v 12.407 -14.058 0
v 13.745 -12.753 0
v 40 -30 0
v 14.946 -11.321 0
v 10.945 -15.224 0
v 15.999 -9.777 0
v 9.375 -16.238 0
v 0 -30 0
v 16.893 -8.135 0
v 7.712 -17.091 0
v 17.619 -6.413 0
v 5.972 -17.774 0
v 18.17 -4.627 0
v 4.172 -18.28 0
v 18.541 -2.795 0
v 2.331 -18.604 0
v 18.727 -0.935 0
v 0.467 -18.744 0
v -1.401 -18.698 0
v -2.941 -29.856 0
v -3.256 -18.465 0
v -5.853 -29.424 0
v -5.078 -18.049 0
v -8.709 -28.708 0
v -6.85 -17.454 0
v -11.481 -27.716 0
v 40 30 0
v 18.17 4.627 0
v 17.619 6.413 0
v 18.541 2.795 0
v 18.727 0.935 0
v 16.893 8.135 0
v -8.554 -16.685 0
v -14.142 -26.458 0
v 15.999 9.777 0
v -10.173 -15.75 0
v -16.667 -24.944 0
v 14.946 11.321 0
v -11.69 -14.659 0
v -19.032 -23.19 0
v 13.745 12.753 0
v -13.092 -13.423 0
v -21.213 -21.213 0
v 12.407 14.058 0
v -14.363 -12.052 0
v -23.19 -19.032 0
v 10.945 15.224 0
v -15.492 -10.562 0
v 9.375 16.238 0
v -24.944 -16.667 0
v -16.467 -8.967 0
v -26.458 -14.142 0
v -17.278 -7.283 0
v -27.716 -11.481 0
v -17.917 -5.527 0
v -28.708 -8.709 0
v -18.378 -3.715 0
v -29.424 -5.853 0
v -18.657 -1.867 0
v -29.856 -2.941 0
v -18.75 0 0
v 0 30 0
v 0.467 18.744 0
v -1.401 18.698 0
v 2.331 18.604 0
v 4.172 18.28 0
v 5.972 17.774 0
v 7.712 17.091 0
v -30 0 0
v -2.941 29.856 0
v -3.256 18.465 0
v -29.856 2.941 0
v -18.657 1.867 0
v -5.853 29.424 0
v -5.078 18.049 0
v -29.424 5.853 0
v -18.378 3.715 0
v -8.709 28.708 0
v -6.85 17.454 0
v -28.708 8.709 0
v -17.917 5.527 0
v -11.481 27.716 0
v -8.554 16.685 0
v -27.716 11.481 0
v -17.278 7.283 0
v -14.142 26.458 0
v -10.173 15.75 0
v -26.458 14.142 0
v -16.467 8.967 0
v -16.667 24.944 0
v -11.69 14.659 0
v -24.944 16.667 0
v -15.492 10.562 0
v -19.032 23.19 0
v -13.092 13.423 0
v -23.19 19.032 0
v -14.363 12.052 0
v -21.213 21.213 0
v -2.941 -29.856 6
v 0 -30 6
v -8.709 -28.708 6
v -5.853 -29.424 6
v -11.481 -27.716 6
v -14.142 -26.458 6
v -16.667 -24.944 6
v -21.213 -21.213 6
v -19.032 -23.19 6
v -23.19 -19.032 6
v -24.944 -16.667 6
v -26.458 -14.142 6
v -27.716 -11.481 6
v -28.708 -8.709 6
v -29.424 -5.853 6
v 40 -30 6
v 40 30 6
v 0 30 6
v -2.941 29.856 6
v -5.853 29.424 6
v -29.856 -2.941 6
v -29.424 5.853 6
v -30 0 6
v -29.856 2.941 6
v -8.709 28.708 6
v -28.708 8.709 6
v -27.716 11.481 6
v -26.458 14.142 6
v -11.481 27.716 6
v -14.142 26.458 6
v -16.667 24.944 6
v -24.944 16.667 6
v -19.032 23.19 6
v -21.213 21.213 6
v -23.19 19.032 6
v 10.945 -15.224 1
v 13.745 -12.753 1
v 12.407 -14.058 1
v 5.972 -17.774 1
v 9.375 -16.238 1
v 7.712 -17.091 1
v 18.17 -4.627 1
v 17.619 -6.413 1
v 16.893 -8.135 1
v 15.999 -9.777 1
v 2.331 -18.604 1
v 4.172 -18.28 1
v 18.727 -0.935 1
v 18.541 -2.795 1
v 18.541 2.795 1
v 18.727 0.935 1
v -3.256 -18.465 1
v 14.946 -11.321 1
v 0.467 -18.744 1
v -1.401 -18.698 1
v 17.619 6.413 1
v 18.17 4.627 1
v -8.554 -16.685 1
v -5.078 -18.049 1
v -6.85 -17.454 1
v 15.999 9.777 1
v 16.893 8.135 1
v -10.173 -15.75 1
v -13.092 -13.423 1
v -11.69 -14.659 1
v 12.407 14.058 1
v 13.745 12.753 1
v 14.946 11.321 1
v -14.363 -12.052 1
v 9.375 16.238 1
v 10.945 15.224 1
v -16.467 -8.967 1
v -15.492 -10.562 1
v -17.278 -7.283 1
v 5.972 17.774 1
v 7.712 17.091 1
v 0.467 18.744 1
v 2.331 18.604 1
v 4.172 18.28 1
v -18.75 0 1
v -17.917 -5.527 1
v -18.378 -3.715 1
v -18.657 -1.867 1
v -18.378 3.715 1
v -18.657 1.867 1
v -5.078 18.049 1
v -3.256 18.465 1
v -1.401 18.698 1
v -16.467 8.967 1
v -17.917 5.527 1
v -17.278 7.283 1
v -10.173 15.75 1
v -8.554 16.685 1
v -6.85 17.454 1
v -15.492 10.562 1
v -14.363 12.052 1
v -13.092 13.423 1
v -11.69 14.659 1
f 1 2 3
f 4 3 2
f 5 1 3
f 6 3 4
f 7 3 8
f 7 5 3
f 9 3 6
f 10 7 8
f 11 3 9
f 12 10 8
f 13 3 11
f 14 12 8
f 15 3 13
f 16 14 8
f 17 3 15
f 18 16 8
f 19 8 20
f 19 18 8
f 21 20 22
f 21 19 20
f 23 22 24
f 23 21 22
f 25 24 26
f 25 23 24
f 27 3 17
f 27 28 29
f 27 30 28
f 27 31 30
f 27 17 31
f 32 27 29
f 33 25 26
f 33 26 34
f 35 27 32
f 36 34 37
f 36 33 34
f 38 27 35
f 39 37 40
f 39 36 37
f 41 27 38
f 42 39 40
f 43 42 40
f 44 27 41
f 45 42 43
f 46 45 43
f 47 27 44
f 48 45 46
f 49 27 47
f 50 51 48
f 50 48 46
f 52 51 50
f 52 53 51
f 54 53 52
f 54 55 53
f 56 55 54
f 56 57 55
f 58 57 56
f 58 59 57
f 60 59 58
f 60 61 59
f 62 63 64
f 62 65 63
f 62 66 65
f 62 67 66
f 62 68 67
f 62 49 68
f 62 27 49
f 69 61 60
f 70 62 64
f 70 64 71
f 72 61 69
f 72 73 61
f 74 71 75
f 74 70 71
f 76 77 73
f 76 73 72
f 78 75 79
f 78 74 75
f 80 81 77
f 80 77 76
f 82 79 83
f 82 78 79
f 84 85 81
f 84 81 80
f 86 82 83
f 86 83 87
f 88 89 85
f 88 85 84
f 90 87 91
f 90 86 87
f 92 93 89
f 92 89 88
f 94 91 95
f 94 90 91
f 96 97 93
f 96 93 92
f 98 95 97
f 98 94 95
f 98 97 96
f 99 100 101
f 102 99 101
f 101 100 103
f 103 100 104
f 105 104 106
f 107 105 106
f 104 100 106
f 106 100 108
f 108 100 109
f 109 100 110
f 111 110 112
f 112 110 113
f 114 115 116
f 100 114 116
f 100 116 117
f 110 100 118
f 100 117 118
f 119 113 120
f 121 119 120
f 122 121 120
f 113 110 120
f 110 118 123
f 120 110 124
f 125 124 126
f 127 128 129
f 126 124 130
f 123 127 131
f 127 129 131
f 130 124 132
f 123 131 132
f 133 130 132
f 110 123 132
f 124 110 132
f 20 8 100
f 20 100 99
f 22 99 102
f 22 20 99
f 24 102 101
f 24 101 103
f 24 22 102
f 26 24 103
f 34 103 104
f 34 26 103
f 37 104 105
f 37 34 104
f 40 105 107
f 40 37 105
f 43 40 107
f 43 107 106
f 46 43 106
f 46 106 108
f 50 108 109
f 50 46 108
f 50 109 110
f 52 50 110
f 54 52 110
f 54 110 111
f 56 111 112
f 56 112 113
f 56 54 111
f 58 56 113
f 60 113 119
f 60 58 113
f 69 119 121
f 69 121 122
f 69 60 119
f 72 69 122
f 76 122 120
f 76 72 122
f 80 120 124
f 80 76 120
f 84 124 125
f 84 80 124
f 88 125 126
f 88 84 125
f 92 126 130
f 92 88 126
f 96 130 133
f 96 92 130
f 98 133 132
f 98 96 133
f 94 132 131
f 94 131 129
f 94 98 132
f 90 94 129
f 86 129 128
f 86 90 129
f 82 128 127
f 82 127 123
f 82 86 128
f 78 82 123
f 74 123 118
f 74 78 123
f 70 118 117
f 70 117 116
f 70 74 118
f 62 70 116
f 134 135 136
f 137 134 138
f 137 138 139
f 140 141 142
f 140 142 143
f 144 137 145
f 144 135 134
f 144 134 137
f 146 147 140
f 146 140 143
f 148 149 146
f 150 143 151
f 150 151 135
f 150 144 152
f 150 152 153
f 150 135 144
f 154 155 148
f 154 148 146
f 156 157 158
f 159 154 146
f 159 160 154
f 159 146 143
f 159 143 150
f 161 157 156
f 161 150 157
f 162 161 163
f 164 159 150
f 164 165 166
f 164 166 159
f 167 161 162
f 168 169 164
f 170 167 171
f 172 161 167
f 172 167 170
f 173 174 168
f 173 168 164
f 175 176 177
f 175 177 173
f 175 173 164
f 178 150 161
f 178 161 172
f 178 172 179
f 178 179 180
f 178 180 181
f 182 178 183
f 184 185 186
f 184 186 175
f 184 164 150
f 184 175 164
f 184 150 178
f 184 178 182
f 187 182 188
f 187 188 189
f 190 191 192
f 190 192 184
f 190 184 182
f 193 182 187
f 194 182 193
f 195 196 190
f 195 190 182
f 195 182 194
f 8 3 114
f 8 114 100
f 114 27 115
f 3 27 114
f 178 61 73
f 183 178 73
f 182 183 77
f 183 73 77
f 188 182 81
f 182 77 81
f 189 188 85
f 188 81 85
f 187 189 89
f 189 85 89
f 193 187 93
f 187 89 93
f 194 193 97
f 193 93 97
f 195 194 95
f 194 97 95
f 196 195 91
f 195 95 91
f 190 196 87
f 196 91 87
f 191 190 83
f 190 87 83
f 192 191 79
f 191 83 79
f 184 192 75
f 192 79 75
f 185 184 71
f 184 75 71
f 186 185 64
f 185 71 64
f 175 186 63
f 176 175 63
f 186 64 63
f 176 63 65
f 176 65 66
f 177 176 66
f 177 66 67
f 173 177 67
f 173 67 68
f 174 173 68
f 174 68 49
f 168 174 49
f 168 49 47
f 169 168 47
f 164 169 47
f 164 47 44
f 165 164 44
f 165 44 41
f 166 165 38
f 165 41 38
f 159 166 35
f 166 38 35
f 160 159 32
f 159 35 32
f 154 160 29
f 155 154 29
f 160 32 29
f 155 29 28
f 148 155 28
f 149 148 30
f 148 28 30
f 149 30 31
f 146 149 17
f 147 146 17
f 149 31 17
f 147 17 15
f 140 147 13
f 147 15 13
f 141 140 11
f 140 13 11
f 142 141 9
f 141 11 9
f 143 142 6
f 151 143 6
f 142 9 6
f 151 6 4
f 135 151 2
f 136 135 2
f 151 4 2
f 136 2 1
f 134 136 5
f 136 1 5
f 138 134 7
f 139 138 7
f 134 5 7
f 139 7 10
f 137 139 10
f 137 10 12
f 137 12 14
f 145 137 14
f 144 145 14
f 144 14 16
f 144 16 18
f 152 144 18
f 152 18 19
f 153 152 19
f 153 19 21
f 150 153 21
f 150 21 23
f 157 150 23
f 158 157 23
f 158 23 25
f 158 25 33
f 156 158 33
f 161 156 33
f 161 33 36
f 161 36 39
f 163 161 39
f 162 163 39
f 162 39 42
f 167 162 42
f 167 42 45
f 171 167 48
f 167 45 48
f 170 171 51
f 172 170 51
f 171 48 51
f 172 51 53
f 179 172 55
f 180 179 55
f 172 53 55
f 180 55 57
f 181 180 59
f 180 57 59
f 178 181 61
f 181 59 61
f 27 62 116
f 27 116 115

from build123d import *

# Parameters (mm, degrees)
EXTRUDE_1_DEPTH     = 6
SKETCH_2_R          = 18.75
CUT_EXTRUDE_1_DEPTH = 1


with BuildPart() as part:
    # 草图1 → 凸台-拉伸1 (new body)
    with BuildSketch(Plane.XY):
        with BuildLine():
            Line((0, 30), (40, 30))
            Line((40, 30), (40, -30))
            Line((40, -30), (0, -30))
            ThreePointArc((0, -30), (-30, 0), (0, 30))
        make_face()
    extrude(amount=EXTRUDE_1_DEPTH)

    # 草图2 → 切除-拉伸1 (cut)
    with BuildSketch(Plane(origin=(0, 0, 0), x_dir=(-1, 0, 0), z_dir=(0, 0, -1))):
        Circle(SKETCH_2_R)
    extrude(amount=-CUT_EXTRUDE_1_DEPTH, mode=Mode.SUBTRACT)


solid = part.part
